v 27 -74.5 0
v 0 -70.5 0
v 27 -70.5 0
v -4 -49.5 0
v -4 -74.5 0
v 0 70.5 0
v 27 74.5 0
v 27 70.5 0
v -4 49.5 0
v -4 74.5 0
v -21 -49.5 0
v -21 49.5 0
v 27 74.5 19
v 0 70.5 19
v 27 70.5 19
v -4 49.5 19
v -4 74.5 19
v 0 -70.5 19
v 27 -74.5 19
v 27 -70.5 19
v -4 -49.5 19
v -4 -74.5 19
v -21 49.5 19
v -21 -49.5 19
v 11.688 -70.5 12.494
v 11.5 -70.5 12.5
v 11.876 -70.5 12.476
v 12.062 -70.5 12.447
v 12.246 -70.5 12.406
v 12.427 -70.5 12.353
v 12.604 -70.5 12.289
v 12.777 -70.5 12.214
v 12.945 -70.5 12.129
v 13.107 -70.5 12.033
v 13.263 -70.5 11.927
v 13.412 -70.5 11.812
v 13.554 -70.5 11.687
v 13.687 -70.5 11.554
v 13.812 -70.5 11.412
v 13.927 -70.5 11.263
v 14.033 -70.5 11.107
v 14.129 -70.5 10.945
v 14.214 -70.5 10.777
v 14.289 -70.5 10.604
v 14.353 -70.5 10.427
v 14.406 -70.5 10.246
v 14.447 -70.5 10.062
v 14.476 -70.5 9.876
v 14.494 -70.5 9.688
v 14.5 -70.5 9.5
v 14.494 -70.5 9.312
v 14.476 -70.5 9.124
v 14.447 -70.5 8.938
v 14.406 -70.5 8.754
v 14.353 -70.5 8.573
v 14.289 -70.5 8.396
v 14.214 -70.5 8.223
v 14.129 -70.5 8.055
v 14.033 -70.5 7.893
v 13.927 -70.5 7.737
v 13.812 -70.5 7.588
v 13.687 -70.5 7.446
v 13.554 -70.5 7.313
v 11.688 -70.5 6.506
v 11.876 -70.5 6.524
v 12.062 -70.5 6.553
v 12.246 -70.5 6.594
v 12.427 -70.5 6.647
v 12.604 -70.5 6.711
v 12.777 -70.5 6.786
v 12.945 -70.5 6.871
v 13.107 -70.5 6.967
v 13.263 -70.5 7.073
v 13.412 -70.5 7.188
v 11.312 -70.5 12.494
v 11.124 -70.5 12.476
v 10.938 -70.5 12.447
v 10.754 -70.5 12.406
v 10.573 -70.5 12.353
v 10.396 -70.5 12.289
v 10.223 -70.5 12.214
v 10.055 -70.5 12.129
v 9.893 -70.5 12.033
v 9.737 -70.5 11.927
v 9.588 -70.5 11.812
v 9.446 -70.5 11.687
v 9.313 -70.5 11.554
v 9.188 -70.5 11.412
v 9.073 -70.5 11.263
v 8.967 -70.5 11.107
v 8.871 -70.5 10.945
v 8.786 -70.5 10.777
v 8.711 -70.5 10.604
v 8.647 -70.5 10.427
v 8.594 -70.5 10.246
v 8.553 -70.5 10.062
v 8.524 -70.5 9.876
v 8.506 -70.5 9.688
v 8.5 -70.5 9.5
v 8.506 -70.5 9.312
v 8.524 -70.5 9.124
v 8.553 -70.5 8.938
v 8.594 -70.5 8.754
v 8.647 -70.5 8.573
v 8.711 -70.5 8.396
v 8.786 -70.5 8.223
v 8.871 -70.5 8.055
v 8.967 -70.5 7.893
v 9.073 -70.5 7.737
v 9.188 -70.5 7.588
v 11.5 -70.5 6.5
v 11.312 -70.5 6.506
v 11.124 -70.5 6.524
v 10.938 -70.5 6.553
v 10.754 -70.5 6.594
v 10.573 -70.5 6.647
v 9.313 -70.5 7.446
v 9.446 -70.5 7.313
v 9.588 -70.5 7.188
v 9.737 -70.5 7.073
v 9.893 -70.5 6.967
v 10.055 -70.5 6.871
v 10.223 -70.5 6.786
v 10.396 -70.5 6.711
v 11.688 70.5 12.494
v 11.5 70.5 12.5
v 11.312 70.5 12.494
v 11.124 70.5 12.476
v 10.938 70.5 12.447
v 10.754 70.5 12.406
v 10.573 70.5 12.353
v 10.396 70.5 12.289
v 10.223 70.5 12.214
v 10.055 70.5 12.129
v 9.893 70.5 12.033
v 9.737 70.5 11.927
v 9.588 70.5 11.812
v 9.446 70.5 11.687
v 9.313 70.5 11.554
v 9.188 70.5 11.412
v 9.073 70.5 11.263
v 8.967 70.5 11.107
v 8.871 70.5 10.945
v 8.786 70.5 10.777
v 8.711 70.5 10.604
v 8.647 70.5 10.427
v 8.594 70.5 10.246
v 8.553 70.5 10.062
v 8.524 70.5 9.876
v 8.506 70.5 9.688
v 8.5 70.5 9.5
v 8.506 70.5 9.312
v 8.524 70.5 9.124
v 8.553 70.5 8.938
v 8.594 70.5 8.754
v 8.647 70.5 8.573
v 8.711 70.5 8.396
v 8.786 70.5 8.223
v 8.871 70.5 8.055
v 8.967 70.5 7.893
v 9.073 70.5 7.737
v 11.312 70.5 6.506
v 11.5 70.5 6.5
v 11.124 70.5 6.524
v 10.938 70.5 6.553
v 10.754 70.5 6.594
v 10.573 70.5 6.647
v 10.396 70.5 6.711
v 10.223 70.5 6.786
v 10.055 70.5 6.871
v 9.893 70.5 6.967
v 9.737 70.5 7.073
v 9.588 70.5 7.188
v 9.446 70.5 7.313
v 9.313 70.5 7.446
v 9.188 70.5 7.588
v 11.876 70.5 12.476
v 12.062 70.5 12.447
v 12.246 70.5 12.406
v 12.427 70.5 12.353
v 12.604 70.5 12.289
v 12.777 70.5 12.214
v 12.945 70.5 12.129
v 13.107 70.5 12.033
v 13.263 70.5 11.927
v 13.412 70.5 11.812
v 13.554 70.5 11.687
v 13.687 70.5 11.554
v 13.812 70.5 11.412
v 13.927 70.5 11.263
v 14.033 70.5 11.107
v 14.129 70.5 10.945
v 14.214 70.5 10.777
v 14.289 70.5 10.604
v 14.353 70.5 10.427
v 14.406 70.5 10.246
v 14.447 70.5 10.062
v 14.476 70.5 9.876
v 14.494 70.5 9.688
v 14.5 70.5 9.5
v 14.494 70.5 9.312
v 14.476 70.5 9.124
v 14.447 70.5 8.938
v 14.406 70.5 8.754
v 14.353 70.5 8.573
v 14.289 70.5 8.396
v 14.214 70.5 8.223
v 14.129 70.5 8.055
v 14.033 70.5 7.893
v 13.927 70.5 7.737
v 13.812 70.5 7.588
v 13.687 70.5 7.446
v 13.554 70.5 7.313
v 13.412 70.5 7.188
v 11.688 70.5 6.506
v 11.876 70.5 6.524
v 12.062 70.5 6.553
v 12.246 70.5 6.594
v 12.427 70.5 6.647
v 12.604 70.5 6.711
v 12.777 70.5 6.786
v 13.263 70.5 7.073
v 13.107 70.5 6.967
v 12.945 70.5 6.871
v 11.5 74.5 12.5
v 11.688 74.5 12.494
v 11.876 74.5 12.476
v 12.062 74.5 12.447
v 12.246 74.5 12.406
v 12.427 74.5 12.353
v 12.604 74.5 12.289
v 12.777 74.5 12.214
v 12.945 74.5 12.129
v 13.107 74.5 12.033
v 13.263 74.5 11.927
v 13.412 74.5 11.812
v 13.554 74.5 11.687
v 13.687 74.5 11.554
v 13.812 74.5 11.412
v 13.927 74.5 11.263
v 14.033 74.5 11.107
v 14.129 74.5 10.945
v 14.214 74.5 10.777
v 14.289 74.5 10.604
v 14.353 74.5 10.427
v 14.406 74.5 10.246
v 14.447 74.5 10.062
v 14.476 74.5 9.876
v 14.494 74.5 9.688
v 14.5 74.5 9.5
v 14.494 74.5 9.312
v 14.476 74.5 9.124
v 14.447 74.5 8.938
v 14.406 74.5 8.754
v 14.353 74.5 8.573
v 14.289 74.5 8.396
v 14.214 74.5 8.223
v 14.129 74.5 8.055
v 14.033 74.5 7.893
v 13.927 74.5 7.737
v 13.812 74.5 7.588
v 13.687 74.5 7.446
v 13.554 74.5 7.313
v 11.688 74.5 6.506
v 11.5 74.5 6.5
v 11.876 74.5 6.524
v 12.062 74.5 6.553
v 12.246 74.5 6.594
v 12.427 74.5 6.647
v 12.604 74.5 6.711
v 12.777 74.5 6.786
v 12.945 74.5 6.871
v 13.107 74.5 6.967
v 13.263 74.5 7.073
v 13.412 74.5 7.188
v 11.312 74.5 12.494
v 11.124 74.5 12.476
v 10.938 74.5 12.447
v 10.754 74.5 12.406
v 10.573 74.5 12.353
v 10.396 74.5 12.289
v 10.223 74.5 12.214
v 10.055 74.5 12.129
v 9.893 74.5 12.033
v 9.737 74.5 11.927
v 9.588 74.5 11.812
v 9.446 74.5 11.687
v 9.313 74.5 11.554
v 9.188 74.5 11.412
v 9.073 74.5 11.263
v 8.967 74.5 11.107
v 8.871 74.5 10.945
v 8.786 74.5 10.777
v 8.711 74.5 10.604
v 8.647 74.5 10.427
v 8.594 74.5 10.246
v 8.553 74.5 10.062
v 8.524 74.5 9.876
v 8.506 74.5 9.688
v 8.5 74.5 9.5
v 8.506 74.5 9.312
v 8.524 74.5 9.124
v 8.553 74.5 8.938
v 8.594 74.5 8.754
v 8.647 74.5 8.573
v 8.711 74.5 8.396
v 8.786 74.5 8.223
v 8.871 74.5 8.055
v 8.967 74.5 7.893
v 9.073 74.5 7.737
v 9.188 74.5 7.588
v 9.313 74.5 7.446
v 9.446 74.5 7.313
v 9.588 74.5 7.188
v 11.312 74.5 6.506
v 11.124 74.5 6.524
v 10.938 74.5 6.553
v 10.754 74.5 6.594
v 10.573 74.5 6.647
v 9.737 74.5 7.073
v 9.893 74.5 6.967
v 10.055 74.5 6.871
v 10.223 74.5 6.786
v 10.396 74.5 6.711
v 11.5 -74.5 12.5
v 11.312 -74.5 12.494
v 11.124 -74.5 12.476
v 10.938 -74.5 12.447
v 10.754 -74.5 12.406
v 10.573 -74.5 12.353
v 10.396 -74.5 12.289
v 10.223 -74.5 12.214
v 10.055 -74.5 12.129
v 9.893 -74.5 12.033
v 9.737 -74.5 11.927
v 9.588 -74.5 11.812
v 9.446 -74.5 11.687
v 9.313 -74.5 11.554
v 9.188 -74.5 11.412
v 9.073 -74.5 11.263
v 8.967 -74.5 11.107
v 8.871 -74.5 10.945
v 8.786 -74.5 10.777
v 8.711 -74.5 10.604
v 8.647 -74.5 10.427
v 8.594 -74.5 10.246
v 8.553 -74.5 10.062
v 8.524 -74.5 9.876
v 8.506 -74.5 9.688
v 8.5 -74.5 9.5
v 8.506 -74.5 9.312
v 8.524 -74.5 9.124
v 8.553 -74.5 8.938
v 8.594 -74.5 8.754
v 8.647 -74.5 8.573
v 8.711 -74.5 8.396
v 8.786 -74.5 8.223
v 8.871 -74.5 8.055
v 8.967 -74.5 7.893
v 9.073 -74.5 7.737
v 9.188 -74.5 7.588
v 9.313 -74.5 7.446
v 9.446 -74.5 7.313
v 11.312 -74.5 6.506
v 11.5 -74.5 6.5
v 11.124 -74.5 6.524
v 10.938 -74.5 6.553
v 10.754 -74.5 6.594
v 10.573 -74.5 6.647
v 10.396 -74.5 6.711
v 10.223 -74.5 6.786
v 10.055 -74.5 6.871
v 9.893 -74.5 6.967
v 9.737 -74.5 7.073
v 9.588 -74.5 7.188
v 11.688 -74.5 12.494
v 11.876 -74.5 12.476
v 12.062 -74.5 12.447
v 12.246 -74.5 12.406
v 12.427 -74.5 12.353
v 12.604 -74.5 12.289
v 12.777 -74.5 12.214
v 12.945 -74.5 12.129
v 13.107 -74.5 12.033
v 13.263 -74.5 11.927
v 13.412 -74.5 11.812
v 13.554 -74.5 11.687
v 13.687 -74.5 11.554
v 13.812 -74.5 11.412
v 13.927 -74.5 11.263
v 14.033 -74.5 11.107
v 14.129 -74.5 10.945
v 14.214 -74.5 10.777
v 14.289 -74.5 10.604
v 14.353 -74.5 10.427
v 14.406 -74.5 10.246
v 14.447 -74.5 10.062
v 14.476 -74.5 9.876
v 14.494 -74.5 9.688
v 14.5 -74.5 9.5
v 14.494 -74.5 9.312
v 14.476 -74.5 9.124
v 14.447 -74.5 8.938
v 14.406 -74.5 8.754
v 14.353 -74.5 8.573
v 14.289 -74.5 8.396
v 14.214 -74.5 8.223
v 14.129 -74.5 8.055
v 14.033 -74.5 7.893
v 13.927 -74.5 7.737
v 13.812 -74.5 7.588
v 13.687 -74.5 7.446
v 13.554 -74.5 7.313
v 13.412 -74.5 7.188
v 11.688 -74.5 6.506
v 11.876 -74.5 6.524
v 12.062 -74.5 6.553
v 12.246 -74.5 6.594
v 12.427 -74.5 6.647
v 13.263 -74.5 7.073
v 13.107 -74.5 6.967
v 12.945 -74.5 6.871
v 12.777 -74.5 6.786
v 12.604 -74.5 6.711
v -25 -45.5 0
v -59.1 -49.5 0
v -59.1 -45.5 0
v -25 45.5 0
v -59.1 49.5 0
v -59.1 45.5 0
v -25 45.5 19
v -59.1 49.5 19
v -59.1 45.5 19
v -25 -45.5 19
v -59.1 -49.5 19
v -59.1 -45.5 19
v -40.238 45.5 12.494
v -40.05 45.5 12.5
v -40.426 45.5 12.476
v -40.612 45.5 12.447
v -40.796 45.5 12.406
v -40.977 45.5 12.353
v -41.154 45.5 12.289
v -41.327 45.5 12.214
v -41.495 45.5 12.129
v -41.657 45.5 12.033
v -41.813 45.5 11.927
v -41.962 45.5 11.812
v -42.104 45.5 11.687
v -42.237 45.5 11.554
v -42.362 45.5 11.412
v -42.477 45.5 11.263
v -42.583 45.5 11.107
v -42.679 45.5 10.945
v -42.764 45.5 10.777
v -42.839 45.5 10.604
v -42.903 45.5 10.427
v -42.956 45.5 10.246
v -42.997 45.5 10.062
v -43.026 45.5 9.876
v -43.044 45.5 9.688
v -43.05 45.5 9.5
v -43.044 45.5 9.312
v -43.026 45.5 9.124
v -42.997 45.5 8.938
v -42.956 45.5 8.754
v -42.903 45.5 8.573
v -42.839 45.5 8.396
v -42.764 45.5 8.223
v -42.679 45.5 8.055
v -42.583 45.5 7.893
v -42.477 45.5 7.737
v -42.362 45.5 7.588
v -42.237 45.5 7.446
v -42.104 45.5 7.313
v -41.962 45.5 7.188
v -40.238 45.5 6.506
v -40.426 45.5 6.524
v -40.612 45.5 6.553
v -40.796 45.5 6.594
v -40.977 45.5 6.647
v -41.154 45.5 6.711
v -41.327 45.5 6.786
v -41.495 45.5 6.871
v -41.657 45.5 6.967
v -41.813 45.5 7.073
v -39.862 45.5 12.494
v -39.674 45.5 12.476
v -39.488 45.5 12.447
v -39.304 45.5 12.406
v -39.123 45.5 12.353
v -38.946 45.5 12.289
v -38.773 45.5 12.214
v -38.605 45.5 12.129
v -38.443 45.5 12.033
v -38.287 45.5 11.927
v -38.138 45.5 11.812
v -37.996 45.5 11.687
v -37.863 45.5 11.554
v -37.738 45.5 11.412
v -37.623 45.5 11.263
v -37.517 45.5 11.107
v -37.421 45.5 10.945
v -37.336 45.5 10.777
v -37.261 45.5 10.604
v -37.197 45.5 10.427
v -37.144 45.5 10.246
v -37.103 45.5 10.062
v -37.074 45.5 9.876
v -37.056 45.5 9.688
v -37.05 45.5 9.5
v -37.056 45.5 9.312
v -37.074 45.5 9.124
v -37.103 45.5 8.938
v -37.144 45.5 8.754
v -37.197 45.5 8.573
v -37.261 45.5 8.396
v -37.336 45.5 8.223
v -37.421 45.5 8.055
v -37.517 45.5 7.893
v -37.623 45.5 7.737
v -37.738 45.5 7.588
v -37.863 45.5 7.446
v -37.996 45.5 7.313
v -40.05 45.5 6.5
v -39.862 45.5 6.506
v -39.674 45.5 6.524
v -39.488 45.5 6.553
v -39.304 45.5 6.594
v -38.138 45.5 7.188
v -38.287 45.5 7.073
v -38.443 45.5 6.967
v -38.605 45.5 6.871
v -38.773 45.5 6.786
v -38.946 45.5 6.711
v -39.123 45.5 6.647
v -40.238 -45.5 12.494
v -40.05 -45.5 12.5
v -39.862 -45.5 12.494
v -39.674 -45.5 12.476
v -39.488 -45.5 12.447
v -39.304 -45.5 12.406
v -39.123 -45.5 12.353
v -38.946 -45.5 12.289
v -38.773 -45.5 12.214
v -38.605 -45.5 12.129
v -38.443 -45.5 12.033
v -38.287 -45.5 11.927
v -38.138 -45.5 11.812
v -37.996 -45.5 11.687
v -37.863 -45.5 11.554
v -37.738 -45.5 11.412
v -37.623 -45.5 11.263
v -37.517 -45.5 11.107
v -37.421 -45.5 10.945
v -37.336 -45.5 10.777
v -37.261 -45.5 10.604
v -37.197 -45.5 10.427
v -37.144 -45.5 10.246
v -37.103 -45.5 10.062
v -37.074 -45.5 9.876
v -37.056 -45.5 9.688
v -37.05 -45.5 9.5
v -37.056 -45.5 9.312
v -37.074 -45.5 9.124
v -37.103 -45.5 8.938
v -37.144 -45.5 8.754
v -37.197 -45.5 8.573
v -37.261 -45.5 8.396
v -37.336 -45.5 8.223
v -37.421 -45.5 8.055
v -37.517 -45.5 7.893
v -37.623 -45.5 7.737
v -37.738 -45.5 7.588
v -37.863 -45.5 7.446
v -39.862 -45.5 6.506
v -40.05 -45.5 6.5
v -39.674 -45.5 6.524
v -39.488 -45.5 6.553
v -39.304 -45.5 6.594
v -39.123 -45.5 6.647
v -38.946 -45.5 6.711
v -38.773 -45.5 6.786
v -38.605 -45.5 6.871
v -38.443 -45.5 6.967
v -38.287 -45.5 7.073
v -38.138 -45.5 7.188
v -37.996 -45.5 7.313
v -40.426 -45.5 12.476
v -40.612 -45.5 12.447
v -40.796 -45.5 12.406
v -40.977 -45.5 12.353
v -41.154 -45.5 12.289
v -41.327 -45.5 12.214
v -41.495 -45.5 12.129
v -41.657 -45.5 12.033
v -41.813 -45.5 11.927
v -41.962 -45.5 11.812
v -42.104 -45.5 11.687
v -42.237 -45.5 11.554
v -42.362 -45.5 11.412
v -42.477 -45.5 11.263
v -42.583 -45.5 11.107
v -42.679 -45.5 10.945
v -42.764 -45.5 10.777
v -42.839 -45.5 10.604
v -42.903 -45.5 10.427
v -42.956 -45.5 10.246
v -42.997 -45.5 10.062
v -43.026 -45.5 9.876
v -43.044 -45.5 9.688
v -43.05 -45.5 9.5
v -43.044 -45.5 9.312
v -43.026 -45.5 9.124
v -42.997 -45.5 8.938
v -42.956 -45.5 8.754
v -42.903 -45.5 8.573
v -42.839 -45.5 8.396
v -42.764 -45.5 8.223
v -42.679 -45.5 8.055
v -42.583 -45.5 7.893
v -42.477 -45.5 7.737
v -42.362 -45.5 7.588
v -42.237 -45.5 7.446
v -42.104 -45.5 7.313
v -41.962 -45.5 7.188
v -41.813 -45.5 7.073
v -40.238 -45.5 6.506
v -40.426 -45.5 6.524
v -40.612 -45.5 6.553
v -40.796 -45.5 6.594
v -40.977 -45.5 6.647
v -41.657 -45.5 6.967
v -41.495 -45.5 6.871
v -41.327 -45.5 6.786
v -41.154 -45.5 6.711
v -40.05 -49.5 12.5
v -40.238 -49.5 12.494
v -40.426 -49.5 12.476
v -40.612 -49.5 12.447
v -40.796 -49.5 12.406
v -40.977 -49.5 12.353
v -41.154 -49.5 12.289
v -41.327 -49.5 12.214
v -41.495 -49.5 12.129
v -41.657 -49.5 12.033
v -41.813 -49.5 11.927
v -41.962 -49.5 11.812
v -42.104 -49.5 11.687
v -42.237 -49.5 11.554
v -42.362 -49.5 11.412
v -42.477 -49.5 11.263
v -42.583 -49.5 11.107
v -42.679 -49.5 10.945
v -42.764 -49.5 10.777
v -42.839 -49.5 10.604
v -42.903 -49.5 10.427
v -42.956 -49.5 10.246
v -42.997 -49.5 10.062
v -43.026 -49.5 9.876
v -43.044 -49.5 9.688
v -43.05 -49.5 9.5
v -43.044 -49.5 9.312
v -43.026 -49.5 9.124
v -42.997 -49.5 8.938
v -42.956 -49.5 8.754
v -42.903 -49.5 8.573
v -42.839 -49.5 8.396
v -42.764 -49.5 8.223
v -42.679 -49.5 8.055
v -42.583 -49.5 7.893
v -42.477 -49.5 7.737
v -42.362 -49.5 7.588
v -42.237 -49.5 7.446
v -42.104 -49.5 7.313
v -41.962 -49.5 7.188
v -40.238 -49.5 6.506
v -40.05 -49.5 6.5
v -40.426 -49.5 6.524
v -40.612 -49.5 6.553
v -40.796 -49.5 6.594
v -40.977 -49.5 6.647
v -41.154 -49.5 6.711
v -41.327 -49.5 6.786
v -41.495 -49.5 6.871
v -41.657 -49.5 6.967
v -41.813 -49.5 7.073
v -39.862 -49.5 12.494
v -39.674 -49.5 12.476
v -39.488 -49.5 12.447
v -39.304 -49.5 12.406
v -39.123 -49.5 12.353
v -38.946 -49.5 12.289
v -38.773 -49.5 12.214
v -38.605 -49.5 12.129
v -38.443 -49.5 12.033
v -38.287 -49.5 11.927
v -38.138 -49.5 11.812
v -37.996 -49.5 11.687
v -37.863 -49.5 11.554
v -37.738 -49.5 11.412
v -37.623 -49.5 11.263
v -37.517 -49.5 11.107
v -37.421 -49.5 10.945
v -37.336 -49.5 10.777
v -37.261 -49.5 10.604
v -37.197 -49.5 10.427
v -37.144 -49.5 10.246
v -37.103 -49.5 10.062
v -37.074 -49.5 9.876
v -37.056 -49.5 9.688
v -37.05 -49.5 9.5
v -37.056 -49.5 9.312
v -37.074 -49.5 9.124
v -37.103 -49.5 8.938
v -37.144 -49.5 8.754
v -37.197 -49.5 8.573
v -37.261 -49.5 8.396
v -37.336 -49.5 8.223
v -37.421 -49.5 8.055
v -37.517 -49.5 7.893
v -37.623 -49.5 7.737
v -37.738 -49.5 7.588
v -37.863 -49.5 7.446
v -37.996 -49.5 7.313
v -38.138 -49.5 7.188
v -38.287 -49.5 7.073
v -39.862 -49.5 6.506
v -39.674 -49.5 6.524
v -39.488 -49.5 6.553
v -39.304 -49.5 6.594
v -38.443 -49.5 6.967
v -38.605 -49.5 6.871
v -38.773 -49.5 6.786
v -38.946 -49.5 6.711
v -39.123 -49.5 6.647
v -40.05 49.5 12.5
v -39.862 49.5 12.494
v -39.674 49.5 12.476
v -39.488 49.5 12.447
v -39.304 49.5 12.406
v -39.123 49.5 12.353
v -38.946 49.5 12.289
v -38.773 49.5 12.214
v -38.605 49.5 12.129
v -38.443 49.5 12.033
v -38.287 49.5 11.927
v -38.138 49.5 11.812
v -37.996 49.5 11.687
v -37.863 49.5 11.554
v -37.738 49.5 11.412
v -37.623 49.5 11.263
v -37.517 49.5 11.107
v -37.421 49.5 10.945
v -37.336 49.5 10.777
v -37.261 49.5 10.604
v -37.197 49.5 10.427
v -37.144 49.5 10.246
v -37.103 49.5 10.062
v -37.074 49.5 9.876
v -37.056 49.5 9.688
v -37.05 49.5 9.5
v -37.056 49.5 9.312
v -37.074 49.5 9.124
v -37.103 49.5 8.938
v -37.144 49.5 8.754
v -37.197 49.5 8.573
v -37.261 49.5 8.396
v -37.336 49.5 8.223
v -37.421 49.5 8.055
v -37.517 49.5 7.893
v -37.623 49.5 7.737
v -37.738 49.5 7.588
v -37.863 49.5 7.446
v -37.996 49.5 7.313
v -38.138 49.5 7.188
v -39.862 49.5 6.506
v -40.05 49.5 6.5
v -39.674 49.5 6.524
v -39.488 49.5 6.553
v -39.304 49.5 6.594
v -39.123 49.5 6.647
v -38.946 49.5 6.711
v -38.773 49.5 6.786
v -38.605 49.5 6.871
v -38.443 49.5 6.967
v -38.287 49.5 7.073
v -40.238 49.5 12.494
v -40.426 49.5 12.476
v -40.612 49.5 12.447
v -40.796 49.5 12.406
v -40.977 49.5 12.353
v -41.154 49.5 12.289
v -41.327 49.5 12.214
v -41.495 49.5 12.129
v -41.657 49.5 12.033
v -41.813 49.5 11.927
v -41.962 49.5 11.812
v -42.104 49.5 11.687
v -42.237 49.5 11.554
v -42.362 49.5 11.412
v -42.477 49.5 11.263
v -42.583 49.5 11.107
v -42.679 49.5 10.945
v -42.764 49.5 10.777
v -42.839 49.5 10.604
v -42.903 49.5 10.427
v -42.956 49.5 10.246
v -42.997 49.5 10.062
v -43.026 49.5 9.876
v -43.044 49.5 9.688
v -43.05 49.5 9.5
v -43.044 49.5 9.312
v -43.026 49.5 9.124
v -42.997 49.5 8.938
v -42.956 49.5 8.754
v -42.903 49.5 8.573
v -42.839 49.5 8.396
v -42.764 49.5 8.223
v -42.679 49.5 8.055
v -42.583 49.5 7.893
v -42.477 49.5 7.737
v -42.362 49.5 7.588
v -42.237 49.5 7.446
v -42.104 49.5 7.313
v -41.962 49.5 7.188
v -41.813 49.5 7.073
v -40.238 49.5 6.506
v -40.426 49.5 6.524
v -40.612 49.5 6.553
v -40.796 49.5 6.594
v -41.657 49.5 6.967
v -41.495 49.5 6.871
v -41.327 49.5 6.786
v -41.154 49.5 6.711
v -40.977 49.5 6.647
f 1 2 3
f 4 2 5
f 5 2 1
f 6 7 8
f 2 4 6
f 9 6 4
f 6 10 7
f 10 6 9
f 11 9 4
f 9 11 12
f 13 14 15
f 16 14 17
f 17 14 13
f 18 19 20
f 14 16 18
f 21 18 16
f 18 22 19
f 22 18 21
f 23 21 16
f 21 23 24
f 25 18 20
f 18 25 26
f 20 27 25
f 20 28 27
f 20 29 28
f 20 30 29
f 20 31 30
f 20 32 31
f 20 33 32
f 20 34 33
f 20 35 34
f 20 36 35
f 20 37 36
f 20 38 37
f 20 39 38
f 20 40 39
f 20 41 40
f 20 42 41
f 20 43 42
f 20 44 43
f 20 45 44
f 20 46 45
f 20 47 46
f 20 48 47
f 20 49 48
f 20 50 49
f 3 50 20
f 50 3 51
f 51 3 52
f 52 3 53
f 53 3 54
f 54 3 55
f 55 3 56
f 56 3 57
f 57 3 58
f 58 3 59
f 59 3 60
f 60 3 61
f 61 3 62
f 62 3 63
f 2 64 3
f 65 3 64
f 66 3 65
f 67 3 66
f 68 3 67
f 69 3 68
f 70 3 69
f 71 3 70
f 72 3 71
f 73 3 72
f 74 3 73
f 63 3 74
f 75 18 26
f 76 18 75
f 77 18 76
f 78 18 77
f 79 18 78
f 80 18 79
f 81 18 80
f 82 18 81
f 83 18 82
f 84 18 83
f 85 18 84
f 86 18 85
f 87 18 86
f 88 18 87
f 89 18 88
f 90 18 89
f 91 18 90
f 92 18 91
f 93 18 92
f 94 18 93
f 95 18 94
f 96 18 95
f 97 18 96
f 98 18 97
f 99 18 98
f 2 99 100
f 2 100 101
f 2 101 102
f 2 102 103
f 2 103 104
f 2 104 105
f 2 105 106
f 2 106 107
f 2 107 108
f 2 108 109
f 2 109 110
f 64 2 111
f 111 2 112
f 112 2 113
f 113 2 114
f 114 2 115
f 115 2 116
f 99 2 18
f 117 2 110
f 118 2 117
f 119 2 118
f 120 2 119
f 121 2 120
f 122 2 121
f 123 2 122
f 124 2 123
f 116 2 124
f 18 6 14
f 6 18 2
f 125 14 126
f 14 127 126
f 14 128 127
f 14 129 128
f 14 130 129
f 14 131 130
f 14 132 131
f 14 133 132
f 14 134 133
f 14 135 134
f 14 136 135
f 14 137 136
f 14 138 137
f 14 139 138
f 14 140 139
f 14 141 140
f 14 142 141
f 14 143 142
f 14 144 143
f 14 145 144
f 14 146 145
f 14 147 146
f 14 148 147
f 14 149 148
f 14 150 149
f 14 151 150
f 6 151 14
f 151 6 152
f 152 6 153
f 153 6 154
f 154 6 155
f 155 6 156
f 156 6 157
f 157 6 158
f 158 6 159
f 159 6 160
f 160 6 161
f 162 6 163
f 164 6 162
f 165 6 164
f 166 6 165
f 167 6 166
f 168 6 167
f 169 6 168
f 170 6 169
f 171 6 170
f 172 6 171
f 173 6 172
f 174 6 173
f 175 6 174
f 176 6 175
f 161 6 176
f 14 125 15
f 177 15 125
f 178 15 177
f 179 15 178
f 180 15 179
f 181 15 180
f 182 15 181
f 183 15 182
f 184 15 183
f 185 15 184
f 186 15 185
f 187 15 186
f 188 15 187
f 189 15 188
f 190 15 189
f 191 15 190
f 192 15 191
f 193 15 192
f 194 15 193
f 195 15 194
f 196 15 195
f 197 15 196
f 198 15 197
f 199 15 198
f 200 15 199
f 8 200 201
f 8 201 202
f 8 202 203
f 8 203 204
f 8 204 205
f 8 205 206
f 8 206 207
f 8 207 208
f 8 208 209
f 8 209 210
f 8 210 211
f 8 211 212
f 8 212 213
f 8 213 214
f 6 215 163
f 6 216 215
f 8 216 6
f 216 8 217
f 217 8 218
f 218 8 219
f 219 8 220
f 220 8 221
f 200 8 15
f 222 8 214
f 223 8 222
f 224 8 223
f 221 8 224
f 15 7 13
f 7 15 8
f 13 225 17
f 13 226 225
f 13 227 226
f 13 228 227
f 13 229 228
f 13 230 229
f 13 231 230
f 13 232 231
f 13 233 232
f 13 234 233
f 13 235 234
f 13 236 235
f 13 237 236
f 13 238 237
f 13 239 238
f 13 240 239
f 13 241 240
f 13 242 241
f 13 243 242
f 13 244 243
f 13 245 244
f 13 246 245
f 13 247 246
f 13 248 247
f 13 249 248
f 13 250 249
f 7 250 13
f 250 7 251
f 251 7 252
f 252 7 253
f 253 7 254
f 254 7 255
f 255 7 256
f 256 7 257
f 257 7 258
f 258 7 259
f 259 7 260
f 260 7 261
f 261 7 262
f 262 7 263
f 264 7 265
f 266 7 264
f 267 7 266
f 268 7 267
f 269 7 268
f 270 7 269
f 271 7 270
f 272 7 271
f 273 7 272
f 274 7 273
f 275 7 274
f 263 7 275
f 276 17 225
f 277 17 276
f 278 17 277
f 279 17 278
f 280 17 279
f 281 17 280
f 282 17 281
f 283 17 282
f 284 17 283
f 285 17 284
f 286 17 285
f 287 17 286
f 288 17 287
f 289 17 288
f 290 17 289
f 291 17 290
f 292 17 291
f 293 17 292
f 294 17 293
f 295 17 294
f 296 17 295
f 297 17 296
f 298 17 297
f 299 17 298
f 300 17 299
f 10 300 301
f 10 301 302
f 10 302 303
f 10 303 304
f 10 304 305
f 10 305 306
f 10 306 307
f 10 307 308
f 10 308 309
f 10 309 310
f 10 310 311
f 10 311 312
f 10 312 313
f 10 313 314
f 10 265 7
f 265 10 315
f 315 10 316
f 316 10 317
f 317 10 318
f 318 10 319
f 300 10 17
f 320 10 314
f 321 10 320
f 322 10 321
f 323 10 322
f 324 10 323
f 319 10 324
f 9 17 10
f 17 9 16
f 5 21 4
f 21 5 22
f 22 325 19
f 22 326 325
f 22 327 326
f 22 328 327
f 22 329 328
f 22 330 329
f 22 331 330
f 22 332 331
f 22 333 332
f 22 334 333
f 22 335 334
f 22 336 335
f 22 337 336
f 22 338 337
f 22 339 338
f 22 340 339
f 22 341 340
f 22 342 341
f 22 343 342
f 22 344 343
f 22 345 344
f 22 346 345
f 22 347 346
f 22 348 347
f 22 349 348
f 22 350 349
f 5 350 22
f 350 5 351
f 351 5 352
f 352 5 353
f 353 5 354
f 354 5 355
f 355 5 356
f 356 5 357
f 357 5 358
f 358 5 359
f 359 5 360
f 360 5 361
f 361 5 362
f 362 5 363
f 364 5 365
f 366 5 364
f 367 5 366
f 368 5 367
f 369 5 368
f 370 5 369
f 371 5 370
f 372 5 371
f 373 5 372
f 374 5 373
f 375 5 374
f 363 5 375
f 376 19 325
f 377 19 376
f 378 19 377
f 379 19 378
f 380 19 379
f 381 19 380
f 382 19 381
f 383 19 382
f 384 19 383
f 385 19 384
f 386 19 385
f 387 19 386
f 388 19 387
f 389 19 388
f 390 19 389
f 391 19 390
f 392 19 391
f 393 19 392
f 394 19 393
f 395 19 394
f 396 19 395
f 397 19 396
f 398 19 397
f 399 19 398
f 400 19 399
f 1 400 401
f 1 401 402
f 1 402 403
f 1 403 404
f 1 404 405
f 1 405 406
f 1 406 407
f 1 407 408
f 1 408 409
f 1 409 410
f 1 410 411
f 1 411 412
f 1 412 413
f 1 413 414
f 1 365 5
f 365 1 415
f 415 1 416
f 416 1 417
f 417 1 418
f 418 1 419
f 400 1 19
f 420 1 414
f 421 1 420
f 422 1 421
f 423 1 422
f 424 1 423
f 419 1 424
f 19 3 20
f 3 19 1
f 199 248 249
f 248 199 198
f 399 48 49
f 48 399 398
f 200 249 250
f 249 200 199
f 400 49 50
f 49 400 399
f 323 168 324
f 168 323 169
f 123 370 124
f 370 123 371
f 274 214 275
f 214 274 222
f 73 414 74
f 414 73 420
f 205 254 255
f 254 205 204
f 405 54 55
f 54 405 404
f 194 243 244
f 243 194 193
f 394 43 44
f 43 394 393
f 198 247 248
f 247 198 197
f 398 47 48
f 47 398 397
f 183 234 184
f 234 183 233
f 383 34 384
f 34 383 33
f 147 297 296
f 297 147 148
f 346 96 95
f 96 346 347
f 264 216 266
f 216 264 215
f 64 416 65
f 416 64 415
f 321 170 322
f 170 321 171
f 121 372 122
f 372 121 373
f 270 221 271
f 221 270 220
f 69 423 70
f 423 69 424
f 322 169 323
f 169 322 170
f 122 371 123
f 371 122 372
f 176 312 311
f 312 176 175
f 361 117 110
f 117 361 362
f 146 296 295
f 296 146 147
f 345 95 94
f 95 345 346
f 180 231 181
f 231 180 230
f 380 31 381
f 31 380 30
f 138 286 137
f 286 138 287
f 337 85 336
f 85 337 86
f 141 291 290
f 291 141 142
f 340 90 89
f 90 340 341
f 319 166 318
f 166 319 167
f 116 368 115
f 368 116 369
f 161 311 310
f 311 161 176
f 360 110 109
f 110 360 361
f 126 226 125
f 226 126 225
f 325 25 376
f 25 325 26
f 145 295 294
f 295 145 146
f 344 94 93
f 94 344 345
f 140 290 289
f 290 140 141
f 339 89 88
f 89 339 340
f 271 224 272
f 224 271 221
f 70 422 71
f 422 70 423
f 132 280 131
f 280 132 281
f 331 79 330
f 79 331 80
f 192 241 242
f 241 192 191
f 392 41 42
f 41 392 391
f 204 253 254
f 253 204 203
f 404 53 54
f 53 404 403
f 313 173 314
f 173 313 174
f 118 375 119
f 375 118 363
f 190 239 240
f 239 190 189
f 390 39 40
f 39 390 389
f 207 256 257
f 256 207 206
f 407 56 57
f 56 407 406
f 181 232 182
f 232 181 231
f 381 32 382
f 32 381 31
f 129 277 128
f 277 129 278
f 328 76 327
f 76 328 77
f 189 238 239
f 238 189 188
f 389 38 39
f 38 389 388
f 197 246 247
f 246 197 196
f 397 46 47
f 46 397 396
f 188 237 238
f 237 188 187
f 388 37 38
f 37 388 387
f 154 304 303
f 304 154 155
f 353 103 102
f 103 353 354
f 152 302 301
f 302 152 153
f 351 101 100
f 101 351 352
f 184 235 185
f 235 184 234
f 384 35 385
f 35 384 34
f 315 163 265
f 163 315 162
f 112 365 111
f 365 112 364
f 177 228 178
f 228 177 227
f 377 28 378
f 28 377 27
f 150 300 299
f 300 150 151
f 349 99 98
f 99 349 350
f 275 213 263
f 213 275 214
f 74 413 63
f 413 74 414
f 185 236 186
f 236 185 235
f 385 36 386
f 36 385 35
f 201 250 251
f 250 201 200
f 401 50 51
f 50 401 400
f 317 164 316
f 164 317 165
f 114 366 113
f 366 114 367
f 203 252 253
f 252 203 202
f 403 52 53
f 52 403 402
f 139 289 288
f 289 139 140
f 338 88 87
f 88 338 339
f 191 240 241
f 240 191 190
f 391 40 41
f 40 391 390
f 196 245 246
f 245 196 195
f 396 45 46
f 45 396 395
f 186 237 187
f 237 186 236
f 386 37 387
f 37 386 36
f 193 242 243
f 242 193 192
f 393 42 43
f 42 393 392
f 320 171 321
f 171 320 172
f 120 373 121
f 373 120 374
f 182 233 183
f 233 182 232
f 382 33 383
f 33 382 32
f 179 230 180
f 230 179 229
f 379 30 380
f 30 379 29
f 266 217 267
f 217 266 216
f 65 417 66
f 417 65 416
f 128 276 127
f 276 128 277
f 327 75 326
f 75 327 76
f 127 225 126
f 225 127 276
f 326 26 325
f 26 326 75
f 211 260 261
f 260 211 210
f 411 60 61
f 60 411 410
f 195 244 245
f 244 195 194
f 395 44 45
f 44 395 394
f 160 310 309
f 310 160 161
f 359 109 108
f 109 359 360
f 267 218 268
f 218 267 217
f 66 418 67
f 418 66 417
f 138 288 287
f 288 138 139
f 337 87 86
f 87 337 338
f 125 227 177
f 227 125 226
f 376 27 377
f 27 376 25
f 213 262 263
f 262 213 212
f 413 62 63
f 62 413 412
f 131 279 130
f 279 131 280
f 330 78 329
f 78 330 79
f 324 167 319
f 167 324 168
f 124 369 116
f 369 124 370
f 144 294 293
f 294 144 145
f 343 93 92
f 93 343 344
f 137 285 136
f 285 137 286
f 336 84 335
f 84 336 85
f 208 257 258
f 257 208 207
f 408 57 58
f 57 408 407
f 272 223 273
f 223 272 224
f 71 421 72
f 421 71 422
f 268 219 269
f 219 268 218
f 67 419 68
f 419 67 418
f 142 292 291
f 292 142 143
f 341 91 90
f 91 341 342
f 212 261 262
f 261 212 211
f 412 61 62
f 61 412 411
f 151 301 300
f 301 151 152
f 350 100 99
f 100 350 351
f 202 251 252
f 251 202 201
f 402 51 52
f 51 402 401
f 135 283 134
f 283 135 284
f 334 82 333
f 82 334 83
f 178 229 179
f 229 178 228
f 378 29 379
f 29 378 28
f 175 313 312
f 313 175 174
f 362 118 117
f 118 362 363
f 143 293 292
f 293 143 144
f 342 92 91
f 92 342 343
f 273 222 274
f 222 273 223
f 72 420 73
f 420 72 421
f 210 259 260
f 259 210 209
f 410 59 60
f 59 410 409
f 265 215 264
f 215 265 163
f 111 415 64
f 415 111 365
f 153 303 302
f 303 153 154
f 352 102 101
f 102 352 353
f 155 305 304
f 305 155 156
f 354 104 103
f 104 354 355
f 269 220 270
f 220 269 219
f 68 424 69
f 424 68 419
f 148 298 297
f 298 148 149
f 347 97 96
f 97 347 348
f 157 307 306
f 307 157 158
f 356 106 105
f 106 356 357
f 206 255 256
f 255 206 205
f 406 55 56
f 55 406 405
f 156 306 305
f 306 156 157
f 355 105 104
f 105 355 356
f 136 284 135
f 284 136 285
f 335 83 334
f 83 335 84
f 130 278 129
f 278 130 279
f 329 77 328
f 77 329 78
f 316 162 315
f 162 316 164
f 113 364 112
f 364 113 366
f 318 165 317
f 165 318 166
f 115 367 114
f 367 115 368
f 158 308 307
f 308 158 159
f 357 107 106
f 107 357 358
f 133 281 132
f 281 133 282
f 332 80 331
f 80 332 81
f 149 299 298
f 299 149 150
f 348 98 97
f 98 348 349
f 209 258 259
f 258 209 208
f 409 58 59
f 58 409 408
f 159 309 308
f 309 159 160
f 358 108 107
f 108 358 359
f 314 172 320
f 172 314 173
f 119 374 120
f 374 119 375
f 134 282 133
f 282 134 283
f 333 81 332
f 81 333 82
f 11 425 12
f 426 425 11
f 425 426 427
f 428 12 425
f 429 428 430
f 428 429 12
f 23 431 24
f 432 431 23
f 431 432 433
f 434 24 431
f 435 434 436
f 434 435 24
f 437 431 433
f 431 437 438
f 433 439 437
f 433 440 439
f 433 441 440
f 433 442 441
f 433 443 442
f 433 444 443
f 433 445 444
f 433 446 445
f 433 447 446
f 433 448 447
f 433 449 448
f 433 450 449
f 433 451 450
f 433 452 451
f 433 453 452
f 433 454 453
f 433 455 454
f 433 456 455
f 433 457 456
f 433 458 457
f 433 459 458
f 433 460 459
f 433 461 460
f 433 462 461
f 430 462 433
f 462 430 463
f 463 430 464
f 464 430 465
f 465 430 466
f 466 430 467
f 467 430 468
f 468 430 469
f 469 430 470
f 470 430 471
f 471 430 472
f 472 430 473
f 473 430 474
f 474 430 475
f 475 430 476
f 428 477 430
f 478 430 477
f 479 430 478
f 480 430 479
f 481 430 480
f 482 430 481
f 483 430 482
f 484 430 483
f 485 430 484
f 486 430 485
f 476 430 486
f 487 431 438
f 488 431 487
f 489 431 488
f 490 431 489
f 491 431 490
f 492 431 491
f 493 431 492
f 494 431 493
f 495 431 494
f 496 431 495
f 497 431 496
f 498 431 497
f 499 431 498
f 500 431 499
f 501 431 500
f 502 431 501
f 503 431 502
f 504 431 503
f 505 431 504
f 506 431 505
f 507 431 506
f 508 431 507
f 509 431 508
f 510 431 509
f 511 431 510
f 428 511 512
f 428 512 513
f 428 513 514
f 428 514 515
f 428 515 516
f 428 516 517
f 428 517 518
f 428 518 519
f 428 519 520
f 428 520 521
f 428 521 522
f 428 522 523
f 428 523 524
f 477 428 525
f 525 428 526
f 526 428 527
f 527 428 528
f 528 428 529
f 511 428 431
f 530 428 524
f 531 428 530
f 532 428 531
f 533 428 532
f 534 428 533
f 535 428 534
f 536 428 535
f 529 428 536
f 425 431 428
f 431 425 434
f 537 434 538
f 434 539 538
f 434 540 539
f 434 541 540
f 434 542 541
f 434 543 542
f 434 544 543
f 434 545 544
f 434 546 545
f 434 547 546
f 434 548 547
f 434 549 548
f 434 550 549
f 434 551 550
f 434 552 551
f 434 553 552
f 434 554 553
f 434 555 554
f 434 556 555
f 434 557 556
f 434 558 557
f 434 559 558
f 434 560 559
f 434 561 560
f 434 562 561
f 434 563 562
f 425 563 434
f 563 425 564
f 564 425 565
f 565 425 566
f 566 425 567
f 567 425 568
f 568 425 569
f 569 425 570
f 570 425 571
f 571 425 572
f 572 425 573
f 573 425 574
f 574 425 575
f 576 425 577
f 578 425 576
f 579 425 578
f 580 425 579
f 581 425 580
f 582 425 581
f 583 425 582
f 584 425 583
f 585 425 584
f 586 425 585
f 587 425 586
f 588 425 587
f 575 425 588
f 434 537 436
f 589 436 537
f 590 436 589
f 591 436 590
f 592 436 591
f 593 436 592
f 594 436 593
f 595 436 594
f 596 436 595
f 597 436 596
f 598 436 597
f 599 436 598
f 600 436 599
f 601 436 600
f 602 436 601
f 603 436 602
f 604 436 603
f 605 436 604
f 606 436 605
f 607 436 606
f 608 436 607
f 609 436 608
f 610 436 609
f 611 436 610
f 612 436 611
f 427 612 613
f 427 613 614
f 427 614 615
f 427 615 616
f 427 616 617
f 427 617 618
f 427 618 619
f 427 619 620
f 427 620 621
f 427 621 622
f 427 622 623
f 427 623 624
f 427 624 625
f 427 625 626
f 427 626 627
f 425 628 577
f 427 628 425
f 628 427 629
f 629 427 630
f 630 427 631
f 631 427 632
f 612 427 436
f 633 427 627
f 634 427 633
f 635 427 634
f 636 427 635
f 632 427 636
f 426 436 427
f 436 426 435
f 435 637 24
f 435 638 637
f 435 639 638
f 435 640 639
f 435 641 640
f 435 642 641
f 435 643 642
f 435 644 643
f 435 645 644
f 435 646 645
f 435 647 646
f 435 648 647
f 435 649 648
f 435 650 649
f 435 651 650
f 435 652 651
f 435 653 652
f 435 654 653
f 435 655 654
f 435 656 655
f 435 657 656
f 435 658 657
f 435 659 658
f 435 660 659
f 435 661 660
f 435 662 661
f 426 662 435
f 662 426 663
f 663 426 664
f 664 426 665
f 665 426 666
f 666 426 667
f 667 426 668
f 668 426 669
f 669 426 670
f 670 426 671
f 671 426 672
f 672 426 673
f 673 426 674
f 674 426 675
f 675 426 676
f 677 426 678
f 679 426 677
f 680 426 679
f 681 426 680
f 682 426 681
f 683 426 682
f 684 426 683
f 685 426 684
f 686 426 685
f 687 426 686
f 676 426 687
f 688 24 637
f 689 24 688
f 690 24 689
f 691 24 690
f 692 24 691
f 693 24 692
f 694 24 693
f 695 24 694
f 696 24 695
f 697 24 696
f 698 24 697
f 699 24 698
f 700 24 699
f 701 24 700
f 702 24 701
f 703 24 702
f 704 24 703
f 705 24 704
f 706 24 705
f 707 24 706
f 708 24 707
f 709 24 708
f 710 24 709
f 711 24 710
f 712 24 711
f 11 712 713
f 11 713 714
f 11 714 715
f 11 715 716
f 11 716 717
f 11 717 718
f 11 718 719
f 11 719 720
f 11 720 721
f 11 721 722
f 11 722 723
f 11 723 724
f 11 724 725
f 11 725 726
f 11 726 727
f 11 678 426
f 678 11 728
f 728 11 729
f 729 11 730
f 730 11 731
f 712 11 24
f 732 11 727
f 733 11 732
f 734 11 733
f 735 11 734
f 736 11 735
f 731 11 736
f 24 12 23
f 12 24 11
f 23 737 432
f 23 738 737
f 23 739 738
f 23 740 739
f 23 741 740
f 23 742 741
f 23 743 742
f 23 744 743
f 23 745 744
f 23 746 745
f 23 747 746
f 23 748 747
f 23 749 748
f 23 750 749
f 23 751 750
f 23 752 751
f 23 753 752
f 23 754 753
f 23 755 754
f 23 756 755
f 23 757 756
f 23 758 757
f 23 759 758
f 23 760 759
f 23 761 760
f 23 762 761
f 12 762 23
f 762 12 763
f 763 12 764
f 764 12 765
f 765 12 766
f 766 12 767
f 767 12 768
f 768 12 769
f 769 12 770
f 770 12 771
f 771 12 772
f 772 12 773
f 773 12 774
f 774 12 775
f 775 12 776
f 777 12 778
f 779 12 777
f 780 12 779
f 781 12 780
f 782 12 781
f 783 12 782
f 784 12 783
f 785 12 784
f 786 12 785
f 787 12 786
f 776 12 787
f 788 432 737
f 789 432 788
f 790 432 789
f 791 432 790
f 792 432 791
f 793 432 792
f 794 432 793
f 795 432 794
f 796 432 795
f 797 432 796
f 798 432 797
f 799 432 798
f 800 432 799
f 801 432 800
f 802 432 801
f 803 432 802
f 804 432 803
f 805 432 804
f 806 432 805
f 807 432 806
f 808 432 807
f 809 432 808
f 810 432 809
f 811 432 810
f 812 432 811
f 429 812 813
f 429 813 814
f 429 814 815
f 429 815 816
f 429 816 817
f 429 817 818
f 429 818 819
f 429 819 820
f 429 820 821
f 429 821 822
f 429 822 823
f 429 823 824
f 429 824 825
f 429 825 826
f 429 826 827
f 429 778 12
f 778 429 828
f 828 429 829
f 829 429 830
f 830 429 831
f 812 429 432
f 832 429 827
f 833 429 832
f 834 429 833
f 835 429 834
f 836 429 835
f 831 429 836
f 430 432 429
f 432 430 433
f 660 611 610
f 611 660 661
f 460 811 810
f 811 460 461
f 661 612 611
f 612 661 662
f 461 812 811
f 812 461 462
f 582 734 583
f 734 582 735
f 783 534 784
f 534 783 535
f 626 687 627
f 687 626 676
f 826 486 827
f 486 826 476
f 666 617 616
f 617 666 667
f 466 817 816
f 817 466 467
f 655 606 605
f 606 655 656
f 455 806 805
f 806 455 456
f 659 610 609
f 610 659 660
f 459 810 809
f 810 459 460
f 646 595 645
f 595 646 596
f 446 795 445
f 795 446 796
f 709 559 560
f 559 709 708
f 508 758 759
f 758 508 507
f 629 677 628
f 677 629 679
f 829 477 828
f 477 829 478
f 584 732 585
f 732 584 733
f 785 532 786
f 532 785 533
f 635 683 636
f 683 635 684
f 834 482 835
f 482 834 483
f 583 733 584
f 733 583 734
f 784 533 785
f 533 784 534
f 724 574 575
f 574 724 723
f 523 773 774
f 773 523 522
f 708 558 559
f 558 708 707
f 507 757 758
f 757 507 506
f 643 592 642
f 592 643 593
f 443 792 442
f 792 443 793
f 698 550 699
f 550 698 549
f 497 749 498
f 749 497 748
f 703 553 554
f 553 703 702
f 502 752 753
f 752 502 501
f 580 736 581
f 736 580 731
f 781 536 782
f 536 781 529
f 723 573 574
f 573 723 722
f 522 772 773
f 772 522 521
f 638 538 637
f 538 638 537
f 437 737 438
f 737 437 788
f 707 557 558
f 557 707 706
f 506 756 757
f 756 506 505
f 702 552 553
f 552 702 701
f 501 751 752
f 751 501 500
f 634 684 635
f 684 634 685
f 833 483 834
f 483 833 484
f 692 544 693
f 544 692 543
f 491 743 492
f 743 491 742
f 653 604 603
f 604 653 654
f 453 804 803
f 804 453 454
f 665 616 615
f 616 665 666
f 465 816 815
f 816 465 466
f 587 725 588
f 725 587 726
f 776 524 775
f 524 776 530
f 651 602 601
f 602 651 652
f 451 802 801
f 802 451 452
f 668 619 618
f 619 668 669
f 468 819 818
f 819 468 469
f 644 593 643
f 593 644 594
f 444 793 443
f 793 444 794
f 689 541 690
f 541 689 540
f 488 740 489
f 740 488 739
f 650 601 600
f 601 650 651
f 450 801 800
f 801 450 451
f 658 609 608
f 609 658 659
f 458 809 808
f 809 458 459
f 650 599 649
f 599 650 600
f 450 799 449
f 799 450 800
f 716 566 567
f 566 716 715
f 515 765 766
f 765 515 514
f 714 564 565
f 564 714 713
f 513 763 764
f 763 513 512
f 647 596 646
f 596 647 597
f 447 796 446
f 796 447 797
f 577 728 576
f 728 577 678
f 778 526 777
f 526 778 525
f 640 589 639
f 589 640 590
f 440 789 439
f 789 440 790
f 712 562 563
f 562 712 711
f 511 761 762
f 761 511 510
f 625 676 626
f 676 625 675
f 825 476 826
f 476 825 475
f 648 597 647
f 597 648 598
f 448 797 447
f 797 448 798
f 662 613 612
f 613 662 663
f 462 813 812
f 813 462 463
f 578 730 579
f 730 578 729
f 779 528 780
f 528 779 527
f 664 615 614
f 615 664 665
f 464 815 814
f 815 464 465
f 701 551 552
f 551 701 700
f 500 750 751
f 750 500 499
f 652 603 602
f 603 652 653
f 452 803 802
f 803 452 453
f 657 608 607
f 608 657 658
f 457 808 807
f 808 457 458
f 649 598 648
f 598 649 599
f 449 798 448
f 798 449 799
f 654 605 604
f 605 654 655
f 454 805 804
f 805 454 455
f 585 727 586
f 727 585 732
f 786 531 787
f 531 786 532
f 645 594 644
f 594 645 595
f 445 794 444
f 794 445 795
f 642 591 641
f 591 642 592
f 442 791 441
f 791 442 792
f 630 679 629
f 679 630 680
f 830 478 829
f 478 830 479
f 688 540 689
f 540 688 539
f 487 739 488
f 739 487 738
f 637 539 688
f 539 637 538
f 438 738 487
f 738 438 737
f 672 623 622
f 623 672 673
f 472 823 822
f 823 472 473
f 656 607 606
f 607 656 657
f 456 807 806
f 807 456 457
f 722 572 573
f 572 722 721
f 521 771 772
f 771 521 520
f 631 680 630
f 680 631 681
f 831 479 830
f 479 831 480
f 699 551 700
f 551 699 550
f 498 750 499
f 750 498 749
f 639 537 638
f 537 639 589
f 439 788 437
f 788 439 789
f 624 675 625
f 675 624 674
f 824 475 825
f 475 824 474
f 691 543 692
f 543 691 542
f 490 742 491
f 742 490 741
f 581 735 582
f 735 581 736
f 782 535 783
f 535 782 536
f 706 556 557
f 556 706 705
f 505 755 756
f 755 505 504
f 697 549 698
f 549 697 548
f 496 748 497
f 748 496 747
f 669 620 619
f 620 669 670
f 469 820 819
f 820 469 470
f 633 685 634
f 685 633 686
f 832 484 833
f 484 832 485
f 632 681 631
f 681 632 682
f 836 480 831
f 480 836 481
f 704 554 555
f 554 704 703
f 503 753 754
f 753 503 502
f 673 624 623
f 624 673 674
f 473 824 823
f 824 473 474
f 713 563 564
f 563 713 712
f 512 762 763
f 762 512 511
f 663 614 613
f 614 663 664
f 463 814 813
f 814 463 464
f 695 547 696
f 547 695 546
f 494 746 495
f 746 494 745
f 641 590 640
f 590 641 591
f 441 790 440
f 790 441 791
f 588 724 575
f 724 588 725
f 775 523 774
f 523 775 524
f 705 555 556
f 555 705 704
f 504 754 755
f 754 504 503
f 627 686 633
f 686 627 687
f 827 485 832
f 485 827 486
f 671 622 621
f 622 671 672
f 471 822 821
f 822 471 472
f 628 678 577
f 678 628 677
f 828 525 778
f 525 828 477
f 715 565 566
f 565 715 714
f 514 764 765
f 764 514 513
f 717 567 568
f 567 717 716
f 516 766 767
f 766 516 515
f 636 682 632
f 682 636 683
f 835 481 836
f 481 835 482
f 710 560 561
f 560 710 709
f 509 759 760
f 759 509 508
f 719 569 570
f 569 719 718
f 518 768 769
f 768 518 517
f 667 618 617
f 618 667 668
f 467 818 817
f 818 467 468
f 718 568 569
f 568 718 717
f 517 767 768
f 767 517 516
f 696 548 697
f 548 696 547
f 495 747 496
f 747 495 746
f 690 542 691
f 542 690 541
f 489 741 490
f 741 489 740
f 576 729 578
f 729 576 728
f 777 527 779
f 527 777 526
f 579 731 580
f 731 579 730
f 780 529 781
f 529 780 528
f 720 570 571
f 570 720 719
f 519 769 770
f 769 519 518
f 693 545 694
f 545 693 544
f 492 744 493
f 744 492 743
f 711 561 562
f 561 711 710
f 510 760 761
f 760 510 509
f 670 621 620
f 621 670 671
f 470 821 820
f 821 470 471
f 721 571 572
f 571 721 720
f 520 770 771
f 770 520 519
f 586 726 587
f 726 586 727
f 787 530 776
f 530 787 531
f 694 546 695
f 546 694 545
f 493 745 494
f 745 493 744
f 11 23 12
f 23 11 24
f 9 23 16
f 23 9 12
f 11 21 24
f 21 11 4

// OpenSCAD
/*
Description : creates spacer brackets used on roof deck trusses. between the 
trekdeck board and treated 2x4. used to keep 2x4 level.
*/

/*****************************************************************************
CONSTANTS
*****************************************************************************/
$fn=100;
PI = 4 * atan2(1,1);
SCREW_RADIUS = 3;

//TreakDeck = TD
TD_WIDTH = 141;
TD_HEIGHT = 31;
TD_RADIUS = 16;
TD_DIMENSIONS = [TD_HEIGHT,TD_WIDTH];
WALL = 4;
BRACKET_LENGTH = 19;
//2x4 wood = TWOx4W
TWOx4W_WIDTH = 91; //adding 2mm having issues with brakets snapping.
TWOx4W_HEIGHT = 38.1;
TWOx4W_DIMENSIONS = [TWOx4W_HEIGHT,TWOx4W_WIDTH];

BASE_OFFSET = TD_HEIGHT + WALL + TWOx4W_HEIGHT + WALL;

SPACER_HEIGHTS=[38,32,25,19,13,6];
SPACER_HEIGHTS_OFFSETS=[0,-2,-8,-20,-38,-60];
SPACER_SIZE_VALUES=[4,8,13,19,25,32,38];

SMALL_METRIC_HEIGHTS = [0,10,15,20,25,30];
SMALL_METRIC_OFFSETS = [0,-35,-60,-85,-100,-110];

LARGE_METRIC_HEIGHTS = [30,35,40,45,50,55];
LARGE_METRIC_OFFSETS = [10,0,0,0,10,20];

MAX_COUNTS = [7,6,5,5,4,4,3];


/*****************************************************************************
FUNCTIONS - code to make reading modules easier to understand.
******************************************************************************/
function half(x) = x/2;
function adjust_dimensions_wall(dimensions, wall) = [dimensions[0]+(2*wall),dimensions[1]+(2*wall)];
function adjustedSpacerHeight(height, wall) = (height > 2*wall) ? height - (2*wall): 0;
function maxCountforSize(size) = MAX_COUNTS[size];
//get the acctual build length
function buildLength(size, count) = ((count + 1) * spacerLength(size)) + TWOx4W_HEIGHT + SPACER_SIZE_VALUES[size] - WALL;
//length for spacer for tight layout.
function spacerLength(size) = TWOx4W_HEIGHT + SPACER_SIZE_VALUES[size];

function getSizeOfSet(index) = SET_DEFINED[index][0];
function getCountOfSet(index) = SET_DEFINED[index][1];
//get spacer length for groups.
function groupSpacerLength(index) = index == 0 ? ((getCountOfSet(0) + 1) * spacerLength(getSizeOfSet(0))) + 5 :
            (
                (getSizeOfSet(index) + 1) * spacerLength(getSizeOfSet(index)) + 
                groupSpacerLength(index-1)
            ) + 5 ;

/*****************************************************************************
Directives - defines what to build with optional features.
*****************************************************************************/
INCLUDE_THING = 0;
BUILD_SUIT = 0; //current set in use.
BUILD_SINGLE_SMALL = 1;
BUILD_SET = 0; //0 = do nothing; 1 = single BUILD_SIZE set; 2 = set of SET_DEFINED.
BUILD_SIZE = 4;
BUILD_COUNT = MAX_COUNTS[BUILD_SIZE];
// SET_DEFINED = [[3,1],[4,0]];
// SET_DEFINED = [[2,1],[3,0]];
// SET_DEFINED = [[0,4]];
SET_DEFINED = [[2,1],[3,2]];
BUILD_SIDE_SET = 0;
BUILD_SIDE_BRACKET = 0;
BUILD_WAVE_SPACER = 0;

/*****************************************************************************
MAIN SUB - where the instructions start.
*****************************************************************************/
build();

/*****************************************************************************
MODULES: - the meat of the project.
*****************************************************************************/
module build()
{
    echo();
    echo(FileName = str("TrustSpacer BS-", BUILD_SIZE,"-", SPACER_SIZE_VALUES[BUILD_SIZE],"mm.stl"));
    echo();

    if(BUILD_SINGLE_SMALL) H_Bracket(SPACER_SIZE_VALUES[BUILD_SIZE]);
    if(BUILD_SUIT) create_suit(SPACER_HEIGHTS, SPACER_HEIGHTS_OFFSETS,5,2);

    if(BUILD_SET ==1) 
    {
        translate([TWOx4W_HEIGHT + SPACER_SIZE_VALUES[BUILD_SIZE] - WALL, 0, 0]) 
        build_single_set(BUILD_SIZE, BUILD_COUNT);
    }
    if(BUILD_SET > 1)
    {
        echo("BUILD_SET");
        build_single_set(getSizeOfSet(0), getCountOfSet(0));
        
        if(getSizeOfSet(1)> 0)
        {
            echo("FIRST SET");
            translate([groupSpacerLength(0), 0, 0])
            build_single_set(getSizeOfSet(1), getCountOfSet(1));
        }

        if(getSizeOfSet(2)> 0)
        {
            echo("SECOUND SET");
            translate([groupSpacerLength(1), 0, 0])
            build_single_set(getSizeOfSet(2), getCountOfSet(2));        
        }

        if(getCountOfSet(3)> 0)
        {
            echo("THRID SET");
            translate([groupSpacerLength(2), 0, 0])
            build_single_set(getSizeOfSet(3), getCountOfSet(3));        
        }
    }

    if(BUILD_SIDE_BRACKET) 
    {
        echo("BUILD_SIDE_BRACKET");
        buildSideBracket();
    }

    if(BUILD_WAVE_SPACER) 
    {
        echo("BUILD_WAVE_SPACER");
        buildWaveSpacer();
    }    
}

/*
    Wave spacer supports wave truss to sport corrigated roof from sagging.
*/
module buildWaveSpacer() 
{
    depth = 21;
    spacer_height = spacerLength(3);
    height = TD_HEIGHT + spacer_height;
    width = 2*height;

    echo(depth,spacer_height,height, width);

    difference()
    {
        linear_extrude(depth)
        polygon(points=[[-height,0],[height,0],[half(depth),height],[-half(depth),height]]);

        translate([0, height/2, depth/2])
        rotate([90, 0, 0]) 
        {
            cylinder(r=1.5, h=height, center=true);            
        }
    }

}

module longRulerStandVisualMarker(braceHeight,braceWidth,rulerWidth,standThickness) {
    difference()
    {
        longRulerStand(braceHeight,braceWidth,rulerWidth,standThickness);

        translate([braceHeight/2 - 6.5,0,0])
        {
            cube([2*braceHeight-rulerWidth,braceHeight+1,11], center=false);
        }
    }

    // rotate([90, 0, 0]) 
    // #cube(size=[(2*braceHeight)+rulerWidth, braceWidth, standThickness]);
}

module longRulerStand(braceHeight,braceWidth,rulerWidth,standThickness)
{
    translate([(braceHeight + rulerWidth), 0, 0]) 
    {
        triangle90(braceHeight,braceHeight,braceWidth);    
    }
    
    translate([braceHeight, 0, 0]) 
    {
        rotate([0,0,90])
        triangle90(braceHeight,braceHeight,braceWidth);    
    }

    // translate([0,0,-half(braceWidth)])
    rotate([90, 0, 0]) 
    cube(size=[(2*braceHeight)+rulerWidth, braceWidth, standThickness]);
}


module buildSideBracket() 
{
    Side_Stacked_Bracket(13);
}

module build_single_set(size, count) 
{
    echo(size=size, count=count+1, spacerLength=spacerLength(size), buildLength=buildLength(size,count));
    for (i=[0:count]) 
    {
        if(BUILD_SIDE_SET)
        {
            translate([(i * spacerLength(size)) , i%2 != 0 ? WALL*2 : 0, 0]) 
            Side_Stacked_Bracket(SPACER_SIZE_VALUES[size]);
        }
        else
        {
            translate([(i * spacerLength(size)) , 0, 0]) 
            H_Bracket(SPACER_SIZE_VALUES[size]);            
        }

    }
}

module build_set(set) 
{
    
}

module create_suit(heights, customOffsets, max = 5, min = 0) {
    
    for ( i = [min:max]) 
    {
        echo(i,SPACER_HEIGHTS[i]);
        translate([(i * BASE_OFFSET) + heights[i] + customOffsets[i], 0, 0]) 
        H_Bracket(heights[i]);
    }
}

module H_Bracket(spacerHeight)
{
    translate([0.5*TD_HEIGHT, 0, 0]) 
    u_bracket(TD_DIMENSIONS, WALL, BRACKET_LENGTH );

    if (spacerHeight > WALL) 
    {
        translate([-(WALL + adjustedSpacerHeight(spacerHeight,WALL)/2), 0, 0]) 
        color("Aqua") spacer(TWOx4W_DIMENSIONS, BRACKET_LENGTH, adjustedSpacerHeight(spacerHeight,WALL));

        translate([-(0.5 * TWOx4W_HEIGHT + 2*WALL + adjustedSpacerHeight(spacerHeight,WALL)), 0, 0]) 
        rotate([0, 0, 180])         
        u_bracket(TWOx4W_DIMENSIONS, WALL, BRACKET_LENGTH );
    }
    else
    {
        translate([-(0.5 * TWOx4W_HEIGHT + WALL), 0, 0]) 
        rotate([0, 0, 180])         
        color("LightCyan") u_bracket(TWOx4W_DIMENSIONS, WALL, BRACKET_LENGTH );
    }
}

module Side_Stacked_Bracket(spacerHeight)
{
    //TD bracket.
    translate([0.5*TD_HEIGHT, 0, 0]) 
    u_bracket(TD_DIMENSIONS, WALL, BRACKET_LENGTH );

    if (spacerHeight > WALL) 
    {
        translate([-(WALL + adjustedSpacerHeight(spacerHeight,WALL)/2), half(TD_WIDTH-TWOx4W_WIDTH), 0]) 
        color("Aqua") spacer(TWOx4W_DIMENSIONS, BRACKET_LENGTH, adjustedSpacerHeight(spacerHeight,WALL));

        //TWOx4W
        translate([-(0.5 * TWOx4W_HEIGHT + 2*WALL + adjustedSpacerHeight(spacerHeight,WALL)), half(TD_WIDTH-TWOx4W_WIDTH), 0]) 
        rotate([0, 0, 180])         
        u_bracket(TWOx4W_DIMENSIONS, WALL, BRACKET_LENGTH );
    }
    else
    {
        translate([-(0.5 * TWOx4W_HEIGHT + WALL), half(TD_WIDTH-TWOx4W_WIDTH), 0]) 
        rotate([0, 0, 180])         
        color("LightCyan") u_bracket(TWOx4W_DIMENSIONS, WALL, BRACKET_LENGTH );
    }
}

module u_bracket(dimensions, wall, length)
{
    difference()
    {
        linear_extrude(height = length)
        difference()
        {
            square(adjust_dimensions_wall(dimensions, wall),center = true);

            square(dimensions,center = true);
            translate([0.5*dimensions[0], -1, 0]) 
            {
                square([2*wall,adjust_dimensions_wall(dimensions, wall)[1]+wall], center = true);    
            }
        }
        
        //create screwhole
        translate([-4, 0, length/2]) 
        rotate([90, 0, 0]) 
        {
            cylinder(r=SCREW_RADIUS, h=dimensions[1]*1.5, center=true);            
        }
    }
}

///
module spacer(dimensions, length, value) 
{
    linear_extrude(height = length)
    square([value,adjust_dimensions_wall(dimensions,WALL)[1]],center = true);
}

module triangle90(height,width,depth) 
{
    linear_extrude(depth)
    scale([width, height, 0]) 
    {
        polygon(points=[[0,0],[1,0],[0,1]]);
    }
}
